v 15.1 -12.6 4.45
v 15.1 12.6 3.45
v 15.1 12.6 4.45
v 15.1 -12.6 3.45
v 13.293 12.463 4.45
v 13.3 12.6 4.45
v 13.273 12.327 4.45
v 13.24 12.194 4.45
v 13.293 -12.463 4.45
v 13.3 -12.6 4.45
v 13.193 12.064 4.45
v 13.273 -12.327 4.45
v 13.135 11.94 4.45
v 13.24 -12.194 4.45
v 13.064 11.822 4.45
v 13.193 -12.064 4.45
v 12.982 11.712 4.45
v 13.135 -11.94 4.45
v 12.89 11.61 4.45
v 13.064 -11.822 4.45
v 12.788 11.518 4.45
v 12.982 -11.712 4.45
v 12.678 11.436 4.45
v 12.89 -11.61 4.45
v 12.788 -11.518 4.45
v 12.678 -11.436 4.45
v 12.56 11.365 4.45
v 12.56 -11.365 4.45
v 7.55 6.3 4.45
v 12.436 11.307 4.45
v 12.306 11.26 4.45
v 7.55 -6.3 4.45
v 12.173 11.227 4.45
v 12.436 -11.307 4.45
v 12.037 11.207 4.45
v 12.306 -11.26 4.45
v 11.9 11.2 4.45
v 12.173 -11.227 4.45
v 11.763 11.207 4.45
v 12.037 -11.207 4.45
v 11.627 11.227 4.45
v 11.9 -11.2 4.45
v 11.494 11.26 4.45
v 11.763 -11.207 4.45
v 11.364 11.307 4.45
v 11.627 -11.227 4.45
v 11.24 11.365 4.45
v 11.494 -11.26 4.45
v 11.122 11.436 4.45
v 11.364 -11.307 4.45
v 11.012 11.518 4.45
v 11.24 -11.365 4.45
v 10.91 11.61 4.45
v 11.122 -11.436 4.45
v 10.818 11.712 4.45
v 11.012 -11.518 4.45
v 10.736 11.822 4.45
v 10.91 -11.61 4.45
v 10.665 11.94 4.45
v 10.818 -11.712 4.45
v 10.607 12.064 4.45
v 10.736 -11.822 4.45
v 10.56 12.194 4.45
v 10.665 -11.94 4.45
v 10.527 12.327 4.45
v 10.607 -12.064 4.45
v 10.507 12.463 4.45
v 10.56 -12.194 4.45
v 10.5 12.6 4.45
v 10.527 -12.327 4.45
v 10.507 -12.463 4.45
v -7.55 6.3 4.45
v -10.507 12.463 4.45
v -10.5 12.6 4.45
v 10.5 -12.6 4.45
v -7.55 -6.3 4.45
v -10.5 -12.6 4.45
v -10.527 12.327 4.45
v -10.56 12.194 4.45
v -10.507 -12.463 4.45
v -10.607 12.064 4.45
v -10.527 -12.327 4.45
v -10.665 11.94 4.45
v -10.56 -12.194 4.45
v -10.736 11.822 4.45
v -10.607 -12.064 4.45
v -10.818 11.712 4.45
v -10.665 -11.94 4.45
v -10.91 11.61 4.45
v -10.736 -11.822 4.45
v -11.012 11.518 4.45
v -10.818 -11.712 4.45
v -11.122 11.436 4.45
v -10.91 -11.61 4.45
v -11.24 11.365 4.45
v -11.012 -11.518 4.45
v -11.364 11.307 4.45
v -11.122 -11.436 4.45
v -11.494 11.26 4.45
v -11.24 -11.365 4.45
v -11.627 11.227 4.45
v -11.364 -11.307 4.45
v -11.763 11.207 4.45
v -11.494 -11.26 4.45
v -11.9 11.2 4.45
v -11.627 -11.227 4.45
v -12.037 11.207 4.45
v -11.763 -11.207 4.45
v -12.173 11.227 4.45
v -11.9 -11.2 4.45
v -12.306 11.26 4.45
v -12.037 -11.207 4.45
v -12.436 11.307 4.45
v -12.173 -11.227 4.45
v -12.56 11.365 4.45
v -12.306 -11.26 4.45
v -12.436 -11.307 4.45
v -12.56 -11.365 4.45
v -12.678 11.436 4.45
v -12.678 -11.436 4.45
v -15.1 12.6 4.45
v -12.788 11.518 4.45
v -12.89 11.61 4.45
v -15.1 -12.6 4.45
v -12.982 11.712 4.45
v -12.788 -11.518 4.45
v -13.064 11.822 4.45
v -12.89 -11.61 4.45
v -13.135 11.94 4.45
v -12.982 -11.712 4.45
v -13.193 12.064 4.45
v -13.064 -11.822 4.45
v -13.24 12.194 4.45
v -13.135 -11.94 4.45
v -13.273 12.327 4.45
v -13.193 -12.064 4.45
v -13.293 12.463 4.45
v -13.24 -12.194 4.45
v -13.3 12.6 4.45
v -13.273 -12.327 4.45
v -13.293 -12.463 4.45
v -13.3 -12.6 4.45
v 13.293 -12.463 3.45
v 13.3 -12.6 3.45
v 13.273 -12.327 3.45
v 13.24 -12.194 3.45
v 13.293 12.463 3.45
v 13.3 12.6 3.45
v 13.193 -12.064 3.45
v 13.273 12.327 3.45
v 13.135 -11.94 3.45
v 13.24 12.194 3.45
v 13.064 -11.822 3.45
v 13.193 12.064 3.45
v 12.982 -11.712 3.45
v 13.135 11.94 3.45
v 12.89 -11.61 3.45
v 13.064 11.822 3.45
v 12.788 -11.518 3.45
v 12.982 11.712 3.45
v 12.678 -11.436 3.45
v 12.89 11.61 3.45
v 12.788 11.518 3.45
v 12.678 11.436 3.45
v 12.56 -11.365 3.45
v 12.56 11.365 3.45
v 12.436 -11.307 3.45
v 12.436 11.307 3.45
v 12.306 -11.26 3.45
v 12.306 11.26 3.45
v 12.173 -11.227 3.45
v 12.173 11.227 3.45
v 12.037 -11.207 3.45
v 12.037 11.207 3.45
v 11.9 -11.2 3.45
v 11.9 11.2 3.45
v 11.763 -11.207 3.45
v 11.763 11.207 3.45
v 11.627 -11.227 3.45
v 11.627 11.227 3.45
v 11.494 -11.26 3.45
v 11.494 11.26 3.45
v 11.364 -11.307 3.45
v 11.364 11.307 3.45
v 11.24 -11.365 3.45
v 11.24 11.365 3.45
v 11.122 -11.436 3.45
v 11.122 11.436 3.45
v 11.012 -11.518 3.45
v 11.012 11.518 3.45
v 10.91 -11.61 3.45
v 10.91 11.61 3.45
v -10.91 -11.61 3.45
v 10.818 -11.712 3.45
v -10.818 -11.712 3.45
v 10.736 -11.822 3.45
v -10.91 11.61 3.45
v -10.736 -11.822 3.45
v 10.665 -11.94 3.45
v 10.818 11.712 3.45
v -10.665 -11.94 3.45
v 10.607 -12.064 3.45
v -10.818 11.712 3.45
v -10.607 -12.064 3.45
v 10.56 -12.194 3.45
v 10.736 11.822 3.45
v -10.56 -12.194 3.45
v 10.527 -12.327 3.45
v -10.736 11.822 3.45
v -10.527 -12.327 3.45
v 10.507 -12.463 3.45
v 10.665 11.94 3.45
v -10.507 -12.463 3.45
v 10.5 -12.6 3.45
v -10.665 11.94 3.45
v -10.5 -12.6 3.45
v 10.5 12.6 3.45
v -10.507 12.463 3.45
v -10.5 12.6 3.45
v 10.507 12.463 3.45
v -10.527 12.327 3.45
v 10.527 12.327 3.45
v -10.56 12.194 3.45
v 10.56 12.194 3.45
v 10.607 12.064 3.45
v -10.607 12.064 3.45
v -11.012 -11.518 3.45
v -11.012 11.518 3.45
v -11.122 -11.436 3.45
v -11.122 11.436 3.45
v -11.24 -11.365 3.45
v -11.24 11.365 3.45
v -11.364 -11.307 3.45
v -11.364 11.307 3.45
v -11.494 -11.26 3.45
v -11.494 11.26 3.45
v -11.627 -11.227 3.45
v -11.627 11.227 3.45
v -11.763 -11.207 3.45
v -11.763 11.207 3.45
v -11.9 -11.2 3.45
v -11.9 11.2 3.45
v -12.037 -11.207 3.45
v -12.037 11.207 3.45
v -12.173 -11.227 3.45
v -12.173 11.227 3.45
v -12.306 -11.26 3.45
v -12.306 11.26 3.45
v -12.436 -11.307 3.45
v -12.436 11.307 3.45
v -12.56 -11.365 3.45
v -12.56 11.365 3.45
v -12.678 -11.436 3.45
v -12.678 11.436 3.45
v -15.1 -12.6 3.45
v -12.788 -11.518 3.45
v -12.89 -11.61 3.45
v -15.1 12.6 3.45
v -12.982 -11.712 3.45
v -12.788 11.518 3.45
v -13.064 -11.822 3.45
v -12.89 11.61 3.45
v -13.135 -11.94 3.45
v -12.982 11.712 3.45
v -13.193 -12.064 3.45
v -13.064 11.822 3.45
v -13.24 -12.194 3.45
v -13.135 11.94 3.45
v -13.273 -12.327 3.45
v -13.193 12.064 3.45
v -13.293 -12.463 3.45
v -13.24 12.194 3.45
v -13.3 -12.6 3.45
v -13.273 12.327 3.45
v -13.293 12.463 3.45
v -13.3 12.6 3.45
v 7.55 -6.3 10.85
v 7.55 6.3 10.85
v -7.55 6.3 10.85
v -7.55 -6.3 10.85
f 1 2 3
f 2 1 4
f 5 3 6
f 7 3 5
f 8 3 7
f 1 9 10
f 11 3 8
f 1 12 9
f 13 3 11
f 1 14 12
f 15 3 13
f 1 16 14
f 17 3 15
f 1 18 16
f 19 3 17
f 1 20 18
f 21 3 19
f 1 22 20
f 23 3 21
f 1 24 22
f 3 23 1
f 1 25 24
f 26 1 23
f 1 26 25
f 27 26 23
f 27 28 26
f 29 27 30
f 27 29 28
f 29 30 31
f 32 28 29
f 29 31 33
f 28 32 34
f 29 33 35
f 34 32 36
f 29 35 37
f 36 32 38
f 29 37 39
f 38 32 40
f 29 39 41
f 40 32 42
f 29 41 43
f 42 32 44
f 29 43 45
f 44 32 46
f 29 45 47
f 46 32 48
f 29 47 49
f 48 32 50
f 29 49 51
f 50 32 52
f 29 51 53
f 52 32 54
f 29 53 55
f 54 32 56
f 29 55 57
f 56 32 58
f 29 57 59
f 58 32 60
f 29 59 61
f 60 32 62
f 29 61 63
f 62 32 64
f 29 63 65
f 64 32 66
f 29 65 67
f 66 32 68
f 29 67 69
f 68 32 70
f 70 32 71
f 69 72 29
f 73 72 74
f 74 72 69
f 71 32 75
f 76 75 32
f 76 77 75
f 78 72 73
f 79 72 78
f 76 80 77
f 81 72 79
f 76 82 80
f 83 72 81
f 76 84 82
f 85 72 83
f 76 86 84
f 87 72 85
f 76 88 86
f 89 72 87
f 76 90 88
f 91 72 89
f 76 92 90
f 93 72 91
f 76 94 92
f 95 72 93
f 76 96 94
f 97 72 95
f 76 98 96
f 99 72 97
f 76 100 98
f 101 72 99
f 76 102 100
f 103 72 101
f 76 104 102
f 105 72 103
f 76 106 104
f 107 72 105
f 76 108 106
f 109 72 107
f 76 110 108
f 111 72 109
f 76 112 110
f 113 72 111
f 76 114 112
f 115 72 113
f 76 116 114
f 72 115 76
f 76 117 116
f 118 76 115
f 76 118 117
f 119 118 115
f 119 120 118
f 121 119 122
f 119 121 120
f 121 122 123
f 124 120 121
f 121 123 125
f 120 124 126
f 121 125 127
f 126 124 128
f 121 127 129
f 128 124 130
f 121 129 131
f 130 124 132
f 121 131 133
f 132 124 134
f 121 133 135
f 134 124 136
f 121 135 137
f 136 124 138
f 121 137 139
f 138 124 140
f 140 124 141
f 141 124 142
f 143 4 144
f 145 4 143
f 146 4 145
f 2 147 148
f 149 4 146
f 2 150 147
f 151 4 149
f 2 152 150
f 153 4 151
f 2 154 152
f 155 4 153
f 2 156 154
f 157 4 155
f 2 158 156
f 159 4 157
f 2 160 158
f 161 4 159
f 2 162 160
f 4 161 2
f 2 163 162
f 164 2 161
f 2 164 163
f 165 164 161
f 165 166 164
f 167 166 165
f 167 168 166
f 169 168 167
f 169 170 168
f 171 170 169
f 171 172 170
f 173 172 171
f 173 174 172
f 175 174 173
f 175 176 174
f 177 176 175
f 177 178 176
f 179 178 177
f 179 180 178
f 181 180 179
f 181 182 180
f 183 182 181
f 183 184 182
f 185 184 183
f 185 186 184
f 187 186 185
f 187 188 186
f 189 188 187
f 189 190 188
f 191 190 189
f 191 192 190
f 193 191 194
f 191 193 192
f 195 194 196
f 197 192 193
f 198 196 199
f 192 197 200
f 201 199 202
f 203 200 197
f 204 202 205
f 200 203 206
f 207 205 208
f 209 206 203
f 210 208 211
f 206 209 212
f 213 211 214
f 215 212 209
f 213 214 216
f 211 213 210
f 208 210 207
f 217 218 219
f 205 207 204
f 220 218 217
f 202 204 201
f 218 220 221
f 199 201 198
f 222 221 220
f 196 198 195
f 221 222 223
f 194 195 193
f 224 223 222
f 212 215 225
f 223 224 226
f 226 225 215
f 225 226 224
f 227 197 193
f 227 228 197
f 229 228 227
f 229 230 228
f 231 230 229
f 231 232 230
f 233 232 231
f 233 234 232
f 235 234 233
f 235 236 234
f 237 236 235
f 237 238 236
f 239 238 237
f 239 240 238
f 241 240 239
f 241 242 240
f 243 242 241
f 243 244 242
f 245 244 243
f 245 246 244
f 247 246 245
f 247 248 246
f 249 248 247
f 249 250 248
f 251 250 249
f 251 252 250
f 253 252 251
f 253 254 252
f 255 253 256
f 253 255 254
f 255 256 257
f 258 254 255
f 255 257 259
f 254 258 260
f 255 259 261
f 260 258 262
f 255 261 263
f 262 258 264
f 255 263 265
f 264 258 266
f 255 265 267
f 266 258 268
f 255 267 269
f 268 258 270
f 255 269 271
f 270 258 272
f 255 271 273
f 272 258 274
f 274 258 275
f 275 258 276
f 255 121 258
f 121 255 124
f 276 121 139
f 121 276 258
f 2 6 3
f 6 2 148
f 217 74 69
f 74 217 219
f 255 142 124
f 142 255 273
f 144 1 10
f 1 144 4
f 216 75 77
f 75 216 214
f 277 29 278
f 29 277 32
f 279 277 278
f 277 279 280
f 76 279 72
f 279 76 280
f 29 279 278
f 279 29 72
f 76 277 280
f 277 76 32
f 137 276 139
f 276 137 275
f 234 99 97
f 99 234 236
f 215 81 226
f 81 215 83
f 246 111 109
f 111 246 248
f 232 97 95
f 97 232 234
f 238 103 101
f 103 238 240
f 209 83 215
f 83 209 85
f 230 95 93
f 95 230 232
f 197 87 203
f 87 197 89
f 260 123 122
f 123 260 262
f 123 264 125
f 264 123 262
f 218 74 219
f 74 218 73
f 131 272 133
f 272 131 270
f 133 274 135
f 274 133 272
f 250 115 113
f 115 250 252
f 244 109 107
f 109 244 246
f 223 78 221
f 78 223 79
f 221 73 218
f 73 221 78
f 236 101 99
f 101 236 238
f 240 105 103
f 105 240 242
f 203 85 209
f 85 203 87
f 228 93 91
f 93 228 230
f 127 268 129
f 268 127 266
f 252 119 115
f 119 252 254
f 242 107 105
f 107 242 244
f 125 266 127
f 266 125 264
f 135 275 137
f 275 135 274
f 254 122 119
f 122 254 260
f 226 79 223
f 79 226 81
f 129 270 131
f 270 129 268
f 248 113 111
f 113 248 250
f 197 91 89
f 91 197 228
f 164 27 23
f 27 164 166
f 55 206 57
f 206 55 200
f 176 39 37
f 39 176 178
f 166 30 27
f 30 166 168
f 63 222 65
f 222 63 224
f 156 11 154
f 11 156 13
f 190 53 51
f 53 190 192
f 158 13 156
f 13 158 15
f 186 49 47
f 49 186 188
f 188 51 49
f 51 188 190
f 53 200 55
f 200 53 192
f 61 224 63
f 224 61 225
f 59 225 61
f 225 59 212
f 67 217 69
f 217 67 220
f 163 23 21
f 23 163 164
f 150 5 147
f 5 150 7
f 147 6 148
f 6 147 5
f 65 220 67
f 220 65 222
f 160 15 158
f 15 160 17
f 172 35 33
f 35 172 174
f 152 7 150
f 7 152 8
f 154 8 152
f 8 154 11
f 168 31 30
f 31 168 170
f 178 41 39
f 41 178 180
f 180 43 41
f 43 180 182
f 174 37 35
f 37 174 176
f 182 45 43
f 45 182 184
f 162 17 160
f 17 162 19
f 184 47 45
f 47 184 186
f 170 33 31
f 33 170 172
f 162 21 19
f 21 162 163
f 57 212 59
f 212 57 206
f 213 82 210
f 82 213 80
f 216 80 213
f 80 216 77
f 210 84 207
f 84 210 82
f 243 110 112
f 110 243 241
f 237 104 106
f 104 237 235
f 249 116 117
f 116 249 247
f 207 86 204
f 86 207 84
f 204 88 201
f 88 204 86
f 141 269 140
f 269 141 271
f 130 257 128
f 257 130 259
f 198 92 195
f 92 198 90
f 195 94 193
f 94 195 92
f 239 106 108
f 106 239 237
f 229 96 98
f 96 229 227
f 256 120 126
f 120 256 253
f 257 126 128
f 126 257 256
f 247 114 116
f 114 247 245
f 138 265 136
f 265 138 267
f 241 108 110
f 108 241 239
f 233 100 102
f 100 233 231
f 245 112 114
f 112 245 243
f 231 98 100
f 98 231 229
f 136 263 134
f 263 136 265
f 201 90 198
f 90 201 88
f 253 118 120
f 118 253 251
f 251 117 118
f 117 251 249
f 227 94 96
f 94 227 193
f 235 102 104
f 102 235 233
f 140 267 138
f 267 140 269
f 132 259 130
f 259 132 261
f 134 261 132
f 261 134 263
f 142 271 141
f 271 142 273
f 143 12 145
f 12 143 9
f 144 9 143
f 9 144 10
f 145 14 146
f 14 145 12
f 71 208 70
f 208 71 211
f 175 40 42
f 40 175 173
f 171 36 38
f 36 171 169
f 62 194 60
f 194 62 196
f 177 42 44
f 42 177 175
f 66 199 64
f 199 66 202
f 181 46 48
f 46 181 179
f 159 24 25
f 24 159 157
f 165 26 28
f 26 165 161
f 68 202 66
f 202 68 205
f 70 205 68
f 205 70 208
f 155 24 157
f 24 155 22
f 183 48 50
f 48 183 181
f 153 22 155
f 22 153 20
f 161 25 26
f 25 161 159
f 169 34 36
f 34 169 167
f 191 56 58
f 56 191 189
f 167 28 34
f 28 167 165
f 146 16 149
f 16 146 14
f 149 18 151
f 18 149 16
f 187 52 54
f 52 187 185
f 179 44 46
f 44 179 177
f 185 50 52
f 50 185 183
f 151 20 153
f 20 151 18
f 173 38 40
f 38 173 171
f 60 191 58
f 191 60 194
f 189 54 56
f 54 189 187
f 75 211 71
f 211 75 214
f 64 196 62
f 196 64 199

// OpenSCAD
$fn = 64;
CAMERA_WIDTH = 30.2;
CAMERA_DEPTH = 25.2;
CAMERA_PCB = 1;
CAMERA_HEIGHT = 6.9;
CAMERA_HOLE_DIAM = 2.8;
CAMERA_HOLE_X_DIST = 23.8;
CAMERA_MOUNT_HEIGHT = 4;
CAMERA_SCREW_DIAM = 1.8;

module camera_pcb(){
  translate([0, 0, (CAMERA_PCB + CAMERA_HEIGHT) / 2]){
    difference(){
      /* PCB + lens */
      union(){
        cube([CAMERA_WIDTH, CAMERA_DEPTH, CAMERA_PCB], true);
        translate([0, 0, CAMERA_HEIGHT / 2]){
          cube([CAMERA_WIDTH / 2, CAMERA_DEPTH / 2, CAMERA_HEIGHT], true);
        }
      }
      /* Top left screw hole */
      translate([-CAMERA_HOLE_X_DIST / 2, CAMERA_DEPTH / 2, 0]){
        cylinder(CAMERA_HEIGHT * 2, CAMERA_HOLE_DIAM / 2, CAMERA_HOLE_DIAM / 2, true);
      }
      /* Top right screw hole */
      translate([CAMERA_HOLE_X_DIST / 2, CAMERA_DEPTH / 2, 0]){
      cylinder(CAMERA_HEIGHT * 2, CAMERA_HOLE_DIAM / 2, CAMERA_HOLE_DIAM / 2, true);
      }
      /* Bottom left screw hole */
      translate([-CAMERA_HOLE_X_DIST / 2, -CAMERA_DEPTH / 2, 0]){
        cylinder(CAMERA_HEIGHT * 2, CAMERA_HOLE_DIAM / 2, CAMERA_HOLE_DIAM / 2, true);
      }
      /* Bottom right screw hole */
      translate([CAMERA_HOLE_X_DIST / 2, -CAMERA_DEPTH / 2, 0]){
        cylinder(CAMERA_HEIGHT * 2, CAMERA_HOLE_DIAM / 2, CAMERA_HOLE_DIAM / 2, true);
      }
    }
  }
}

camera_pcb();
